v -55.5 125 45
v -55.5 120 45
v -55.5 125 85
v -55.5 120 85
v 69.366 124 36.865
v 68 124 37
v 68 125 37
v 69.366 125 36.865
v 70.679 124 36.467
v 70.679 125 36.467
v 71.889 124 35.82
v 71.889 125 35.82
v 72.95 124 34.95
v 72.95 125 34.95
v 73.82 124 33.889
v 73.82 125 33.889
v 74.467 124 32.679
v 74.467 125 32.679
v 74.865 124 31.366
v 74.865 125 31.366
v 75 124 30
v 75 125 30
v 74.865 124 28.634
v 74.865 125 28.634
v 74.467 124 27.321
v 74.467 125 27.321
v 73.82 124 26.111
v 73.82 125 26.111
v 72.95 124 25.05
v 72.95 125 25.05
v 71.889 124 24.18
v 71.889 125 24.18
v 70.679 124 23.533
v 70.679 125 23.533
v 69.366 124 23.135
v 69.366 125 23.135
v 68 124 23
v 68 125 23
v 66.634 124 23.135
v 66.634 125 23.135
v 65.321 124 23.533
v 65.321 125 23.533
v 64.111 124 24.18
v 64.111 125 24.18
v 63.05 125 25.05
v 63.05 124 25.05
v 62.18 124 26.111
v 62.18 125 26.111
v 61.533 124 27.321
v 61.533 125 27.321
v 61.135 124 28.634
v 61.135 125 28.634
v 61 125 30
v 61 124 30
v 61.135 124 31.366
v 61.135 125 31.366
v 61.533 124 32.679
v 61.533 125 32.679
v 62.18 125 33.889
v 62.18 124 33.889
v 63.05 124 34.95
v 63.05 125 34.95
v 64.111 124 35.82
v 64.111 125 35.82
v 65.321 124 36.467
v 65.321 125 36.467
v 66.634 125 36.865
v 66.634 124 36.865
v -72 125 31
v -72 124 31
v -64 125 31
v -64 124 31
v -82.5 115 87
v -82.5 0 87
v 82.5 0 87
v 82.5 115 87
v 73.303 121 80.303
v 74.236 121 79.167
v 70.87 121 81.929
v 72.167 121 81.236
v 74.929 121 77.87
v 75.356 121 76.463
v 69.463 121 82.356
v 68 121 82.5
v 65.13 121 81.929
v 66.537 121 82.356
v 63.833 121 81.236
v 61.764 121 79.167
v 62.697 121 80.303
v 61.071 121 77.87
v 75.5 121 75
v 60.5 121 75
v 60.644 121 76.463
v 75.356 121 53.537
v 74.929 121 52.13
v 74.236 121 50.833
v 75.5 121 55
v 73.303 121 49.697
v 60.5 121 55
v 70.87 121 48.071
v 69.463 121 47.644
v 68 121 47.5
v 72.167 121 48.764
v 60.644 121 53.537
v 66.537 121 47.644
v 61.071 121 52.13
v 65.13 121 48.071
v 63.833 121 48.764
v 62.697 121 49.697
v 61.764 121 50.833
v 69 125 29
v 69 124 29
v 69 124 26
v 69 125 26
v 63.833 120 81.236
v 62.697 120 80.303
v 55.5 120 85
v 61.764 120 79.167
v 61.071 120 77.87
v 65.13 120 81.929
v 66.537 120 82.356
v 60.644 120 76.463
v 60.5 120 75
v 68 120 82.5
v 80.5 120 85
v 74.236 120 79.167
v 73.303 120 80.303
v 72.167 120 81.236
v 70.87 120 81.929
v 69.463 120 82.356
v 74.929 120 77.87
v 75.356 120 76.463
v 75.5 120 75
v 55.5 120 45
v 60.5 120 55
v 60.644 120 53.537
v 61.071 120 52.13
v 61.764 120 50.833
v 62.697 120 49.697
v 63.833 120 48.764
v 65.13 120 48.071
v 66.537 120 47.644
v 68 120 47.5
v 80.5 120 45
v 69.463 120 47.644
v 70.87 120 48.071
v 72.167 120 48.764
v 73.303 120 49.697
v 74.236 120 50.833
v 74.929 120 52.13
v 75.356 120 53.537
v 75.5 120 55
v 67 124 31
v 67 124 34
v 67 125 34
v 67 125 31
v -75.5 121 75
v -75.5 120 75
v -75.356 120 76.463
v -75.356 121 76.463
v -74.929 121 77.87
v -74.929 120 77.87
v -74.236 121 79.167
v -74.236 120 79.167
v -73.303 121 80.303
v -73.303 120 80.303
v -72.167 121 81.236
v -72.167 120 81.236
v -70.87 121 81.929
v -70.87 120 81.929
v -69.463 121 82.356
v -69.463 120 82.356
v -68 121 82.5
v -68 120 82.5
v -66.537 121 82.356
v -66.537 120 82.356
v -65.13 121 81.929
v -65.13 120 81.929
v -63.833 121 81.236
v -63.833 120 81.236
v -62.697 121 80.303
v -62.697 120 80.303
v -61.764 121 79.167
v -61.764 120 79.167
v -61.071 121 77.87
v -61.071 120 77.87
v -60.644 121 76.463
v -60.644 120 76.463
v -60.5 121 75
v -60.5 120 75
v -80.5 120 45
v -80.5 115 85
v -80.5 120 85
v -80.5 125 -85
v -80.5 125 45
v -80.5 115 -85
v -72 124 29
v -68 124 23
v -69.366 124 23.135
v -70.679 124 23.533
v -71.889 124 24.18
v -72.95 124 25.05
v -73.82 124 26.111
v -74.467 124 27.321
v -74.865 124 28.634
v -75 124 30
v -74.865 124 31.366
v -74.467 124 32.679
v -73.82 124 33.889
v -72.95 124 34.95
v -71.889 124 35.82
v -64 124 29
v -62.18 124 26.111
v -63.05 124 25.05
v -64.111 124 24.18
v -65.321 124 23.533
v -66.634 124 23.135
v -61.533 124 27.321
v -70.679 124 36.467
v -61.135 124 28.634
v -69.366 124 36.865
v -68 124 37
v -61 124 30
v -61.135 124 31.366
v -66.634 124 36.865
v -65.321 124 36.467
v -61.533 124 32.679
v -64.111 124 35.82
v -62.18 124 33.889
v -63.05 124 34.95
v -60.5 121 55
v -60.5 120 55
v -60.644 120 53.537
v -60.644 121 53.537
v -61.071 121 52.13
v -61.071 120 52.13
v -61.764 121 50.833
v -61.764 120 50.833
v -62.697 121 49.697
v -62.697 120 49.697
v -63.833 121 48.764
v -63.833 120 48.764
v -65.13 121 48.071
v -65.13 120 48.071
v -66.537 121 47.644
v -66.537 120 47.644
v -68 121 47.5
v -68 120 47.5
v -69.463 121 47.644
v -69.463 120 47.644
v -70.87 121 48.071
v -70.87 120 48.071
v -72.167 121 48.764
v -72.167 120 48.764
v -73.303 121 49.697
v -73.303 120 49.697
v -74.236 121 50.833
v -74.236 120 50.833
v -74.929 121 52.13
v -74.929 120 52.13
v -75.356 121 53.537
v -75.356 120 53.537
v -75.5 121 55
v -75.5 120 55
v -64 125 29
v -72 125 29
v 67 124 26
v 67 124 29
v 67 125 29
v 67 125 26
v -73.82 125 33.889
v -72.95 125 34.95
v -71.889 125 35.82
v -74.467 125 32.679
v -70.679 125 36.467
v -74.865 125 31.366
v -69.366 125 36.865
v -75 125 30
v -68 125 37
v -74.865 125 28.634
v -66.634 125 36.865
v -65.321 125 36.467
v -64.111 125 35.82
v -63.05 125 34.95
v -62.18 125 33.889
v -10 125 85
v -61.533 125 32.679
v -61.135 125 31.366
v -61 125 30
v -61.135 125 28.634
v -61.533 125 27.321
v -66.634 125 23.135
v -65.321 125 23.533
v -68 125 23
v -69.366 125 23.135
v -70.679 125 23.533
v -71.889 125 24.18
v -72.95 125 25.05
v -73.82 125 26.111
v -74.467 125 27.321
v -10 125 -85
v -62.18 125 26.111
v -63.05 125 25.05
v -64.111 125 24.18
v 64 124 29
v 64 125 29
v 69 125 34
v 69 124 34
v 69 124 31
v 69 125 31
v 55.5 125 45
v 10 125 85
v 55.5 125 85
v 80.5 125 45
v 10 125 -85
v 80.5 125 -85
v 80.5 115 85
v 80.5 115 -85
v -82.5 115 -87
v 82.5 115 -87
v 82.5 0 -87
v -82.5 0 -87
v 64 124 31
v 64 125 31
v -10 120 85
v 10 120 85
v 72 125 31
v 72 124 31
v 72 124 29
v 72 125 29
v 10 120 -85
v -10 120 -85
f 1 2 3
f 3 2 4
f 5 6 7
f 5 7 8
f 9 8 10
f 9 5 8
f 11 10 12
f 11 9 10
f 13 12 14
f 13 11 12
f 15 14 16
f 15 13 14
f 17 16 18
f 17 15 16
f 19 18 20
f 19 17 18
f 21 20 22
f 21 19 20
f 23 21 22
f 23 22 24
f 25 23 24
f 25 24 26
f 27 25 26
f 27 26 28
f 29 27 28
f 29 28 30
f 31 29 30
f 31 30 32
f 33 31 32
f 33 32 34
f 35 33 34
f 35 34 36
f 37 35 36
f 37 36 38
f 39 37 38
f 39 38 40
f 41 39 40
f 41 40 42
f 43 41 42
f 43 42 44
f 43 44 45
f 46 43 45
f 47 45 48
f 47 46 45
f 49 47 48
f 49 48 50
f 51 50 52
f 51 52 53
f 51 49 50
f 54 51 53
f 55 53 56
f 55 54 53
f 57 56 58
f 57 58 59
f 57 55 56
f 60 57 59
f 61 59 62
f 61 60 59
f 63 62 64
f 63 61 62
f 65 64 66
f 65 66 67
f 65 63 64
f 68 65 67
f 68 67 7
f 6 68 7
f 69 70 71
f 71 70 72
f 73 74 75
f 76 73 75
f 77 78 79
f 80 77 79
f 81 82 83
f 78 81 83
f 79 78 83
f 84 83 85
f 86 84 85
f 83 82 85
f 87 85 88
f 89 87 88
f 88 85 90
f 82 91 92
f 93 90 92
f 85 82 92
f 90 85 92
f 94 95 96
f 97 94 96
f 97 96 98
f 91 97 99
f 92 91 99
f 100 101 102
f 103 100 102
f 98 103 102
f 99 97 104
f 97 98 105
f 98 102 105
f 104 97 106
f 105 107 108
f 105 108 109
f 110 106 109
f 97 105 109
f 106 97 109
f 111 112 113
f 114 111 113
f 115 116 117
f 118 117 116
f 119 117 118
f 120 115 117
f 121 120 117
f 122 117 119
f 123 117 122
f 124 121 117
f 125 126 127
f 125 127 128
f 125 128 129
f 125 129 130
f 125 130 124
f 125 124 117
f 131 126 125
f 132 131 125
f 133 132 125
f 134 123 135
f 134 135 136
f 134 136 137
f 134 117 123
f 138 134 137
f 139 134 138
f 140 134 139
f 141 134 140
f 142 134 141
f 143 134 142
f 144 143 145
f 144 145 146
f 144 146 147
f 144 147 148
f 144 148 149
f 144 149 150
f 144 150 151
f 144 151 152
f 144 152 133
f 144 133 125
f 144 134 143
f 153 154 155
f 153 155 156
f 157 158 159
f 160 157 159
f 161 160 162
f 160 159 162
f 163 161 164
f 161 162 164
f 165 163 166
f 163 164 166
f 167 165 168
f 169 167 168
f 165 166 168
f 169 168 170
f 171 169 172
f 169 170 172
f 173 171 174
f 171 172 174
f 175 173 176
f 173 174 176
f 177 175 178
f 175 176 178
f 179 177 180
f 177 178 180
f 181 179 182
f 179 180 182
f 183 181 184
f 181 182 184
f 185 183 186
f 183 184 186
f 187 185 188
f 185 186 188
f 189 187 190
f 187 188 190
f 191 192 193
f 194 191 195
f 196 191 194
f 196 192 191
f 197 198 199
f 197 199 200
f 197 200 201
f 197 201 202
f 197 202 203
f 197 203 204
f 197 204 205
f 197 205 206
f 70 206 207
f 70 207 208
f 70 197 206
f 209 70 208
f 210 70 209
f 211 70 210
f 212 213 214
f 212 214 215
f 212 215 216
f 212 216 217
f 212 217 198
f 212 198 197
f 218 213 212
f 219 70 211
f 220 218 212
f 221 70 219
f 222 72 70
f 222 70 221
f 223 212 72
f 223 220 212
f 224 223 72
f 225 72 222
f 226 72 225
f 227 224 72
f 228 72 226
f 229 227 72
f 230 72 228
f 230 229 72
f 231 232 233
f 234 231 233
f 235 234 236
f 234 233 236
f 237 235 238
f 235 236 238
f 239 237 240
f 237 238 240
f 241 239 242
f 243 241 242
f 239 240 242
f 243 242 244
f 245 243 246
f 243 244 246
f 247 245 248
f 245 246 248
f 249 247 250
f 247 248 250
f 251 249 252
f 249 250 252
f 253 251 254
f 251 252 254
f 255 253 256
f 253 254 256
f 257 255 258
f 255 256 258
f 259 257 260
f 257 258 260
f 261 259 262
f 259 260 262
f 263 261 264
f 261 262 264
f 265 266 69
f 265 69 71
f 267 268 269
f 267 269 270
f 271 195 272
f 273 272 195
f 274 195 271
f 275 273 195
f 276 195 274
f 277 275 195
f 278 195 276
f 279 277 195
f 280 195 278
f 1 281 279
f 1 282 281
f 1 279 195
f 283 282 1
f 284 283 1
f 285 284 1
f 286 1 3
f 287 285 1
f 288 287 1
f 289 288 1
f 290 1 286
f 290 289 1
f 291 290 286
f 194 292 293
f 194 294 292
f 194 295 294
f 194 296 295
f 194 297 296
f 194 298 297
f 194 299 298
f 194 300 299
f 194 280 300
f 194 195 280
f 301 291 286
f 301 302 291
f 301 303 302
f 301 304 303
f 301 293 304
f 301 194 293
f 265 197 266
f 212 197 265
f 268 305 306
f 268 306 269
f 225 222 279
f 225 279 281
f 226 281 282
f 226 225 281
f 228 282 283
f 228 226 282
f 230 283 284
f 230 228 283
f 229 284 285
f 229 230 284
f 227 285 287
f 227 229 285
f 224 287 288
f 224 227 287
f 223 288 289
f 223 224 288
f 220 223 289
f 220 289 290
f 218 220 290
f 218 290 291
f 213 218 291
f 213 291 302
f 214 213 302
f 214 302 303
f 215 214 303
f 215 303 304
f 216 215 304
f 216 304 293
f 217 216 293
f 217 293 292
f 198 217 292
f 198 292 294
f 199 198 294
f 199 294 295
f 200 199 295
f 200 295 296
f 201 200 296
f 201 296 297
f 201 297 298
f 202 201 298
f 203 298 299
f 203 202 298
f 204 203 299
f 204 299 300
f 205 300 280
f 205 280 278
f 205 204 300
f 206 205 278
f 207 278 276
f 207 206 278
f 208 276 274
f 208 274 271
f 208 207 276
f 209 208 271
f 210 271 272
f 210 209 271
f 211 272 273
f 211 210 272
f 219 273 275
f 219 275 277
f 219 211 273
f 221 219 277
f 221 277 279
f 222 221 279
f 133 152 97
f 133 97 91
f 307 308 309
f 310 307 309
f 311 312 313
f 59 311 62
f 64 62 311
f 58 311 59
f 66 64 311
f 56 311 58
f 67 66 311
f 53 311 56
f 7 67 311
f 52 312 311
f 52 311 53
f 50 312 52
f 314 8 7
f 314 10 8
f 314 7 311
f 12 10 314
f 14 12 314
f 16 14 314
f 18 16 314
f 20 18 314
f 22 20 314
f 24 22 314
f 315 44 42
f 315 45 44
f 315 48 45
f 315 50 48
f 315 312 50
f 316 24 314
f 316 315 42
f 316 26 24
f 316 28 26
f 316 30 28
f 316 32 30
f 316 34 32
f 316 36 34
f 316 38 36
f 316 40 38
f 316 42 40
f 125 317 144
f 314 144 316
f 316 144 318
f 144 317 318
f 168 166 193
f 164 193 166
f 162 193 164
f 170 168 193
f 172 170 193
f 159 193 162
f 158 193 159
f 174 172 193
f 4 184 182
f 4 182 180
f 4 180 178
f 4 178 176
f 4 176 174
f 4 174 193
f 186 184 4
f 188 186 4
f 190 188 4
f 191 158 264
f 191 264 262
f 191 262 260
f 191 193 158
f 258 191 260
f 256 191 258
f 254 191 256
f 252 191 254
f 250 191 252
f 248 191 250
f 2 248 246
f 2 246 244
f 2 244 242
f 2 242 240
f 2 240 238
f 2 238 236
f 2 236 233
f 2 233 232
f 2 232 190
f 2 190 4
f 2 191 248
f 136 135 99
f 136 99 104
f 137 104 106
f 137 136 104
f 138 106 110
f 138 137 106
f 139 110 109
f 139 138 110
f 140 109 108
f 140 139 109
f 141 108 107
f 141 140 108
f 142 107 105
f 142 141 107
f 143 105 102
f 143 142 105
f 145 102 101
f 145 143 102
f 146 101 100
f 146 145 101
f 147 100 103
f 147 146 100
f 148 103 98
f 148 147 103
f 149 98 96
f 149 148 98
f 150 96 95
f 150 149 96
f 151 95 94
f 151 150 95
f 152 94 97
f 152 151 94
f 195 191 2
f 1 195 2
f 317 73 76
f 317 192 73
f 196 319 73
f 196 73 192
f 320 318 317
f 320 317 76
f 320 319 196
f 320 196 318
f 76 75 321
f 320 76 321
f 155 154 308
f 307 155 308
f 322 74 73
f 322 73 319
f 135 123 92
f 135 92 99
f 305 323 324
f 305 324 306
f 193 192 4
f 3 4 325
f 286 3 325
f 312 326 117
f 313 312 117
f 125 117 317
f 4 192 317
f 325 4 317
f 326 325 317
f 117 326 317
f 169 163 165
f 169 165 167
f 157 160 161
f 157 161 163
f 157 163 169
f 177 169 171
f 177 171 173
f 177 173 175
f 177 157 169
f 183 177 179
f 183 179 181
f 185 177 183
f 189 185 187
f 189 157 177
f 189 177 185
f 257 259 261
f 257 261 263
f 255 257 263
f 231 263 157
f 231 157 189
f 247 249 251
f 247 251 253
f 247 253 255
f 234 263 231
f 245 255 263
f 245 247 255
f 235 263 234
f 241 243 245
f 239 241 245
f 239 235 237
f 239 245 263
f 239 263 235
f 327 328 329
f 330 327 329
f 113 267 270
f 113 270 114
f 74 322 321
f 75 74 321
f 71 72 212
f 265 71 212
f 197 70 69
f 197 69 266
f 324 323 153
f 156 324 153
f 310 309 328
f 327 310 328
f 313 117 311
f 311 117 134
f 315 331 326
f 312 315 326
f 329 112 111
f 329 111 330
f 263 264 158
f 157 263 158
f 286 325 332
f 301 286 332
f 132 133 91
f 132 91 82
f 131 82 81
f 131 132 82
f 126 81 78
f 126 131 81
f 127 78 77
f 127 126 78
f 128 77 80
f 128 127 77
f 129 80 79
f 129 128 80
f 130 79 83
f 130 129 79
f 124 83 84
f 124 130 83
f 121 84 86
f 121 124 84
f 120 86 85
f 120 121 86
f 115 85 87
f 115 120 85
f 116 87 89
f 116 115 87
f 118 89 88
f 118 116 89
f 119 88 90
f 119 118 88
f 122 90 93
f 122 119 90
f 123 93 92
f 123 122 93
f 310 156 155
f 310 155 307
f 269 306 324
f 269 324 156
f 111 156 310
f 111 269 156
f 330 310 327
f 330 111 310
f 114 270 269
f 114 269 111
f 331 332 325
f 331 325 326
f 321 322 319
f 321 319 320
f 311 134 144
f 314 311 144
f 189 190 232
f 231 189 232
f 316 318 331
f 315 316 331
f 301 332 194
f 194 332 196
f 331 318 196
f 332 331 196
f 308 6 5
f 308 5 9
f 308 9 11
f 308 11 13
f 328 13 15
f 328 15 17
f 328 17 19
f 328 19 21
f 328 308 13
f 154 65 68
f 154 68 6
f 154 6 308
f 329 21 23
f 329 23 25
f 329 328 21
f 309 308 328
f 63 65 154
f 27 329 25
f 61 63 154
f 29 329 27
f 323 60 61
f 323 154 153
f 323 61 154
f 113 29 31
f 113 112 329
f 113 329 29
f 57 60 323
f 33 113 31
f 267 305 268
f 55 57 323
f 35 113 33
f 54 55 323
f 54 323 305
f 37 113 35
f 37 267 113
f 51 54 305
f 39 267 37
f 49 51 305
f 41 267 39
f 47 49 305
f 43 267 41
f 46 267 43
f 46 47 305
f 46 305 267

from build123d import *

# Parameters (mm, degrees)
SKETCH1_R             = 7
BOSS_EXTRUDE3_DEPTH   = 125
BOSS_EXTRUDE3_2_DEPTH = 125
SKETCH1_W             = 8
SKETCH1_H             = 2
BOSS_EXTRUDE3_3_DEPTH = 125
BOSS_EXTRUDE3_4_DEPTH = 125
SKETCH1_6_R           = 7
BOSS_EXTRUDE4_DEPTH   = 124
SKETCH1_7_W           = 20
SKETCH1_7_H           = 170
SKETCH1_7_W_2         = 25
SKETCH1_7_H_2         = 40
BOSS_EXTRUDE5_DEPTH   = 120
BOSS_EXTRUDE6_DEPTH   = 121
SKETCH1_10_W          = 165
SKETCH1_10_H          = 174
BOSS_EXTRUDE7_DEPTH   = 115


with BuildPart() as part:
    # Sketch1 → Boss-Extrude3 (new body)
    with BuildSketch(Plane(origin=(0, 0, 0), x_dir=(1, 0, 0), z_dir=(0, 1, 0))):
        Polygon((80.5, -45), (80.5, 85), (10, 85), (10, -85), (55.5, -85), (55.5, -45), align=None)
        with Locations((68, -30)):
            Circle(SKETCH1_R, mode=Mode.SUBTRACT)
    extrude(amount=BOSS_EXTRUDE3_DEPTH)



with BuildPart() as body_2:
    # Sketch1 → Boss-Extrude3 2 (new body)
    with BuildSketch(Plane(origin=(0, 0, 0), x_dir=(1, 0, 0), z_dir=(0, 1, 0))):
        Polygon((-10, -85), (-10, 85), (-80.5, 85), (-80.5, -45), (-55.5, -45), (-55.5, -85), align=None)
        with Locations((-68, -30)):
            Circle(SKETCH1_R, mode=Mode.SUBTRACT)
    extrude(amount=BOSS_EXTRUDE3_2_DEPTH)


with BuildPart() as body_3:
    # Sketch1 → Boss-Extrude3 3 (new body)
    with BuildSketch(Plane(origin=(0, 0, 0), x_dir=(1, 0, 0), z_dir=(0, 1, 0))):
        with Locations((-68, -30)):
            Rectangle(SKETCH1_W, SKETCH1_H)
    extrude(amount=BOSS_EXTRUDE3_3_DEPTH)


with BuildPart() as body_4:
    # Sketch1 → Boss-Extrude3 4 (new body)
    with BuildSketch(Plane(origin=(0, 0, 0), x_dir=(1, 0, 0), z_dir=(0, 1, 0))):
        Polygon((72, -31), (72, -29), (69, -29), (69, -26), (67, -26), (67, -29), (64, -29), (64, -31), (67, -31), (67, -34), (69, -34), (69, -31), align=None)
    extrude(amount=BOSS_EXTRUDE3_4_DEPTH)


with BuildPart() as part_1:
    add(part.part)

    add(body_2.part)  # Boss-Extrude4 merges body 2

    add(body_3.part)  # Boss-Extrude4 merges body 3

    add(body_4.part)  # Boss-Extrude4 merges body 4
    # Sketch1<6> → Boss-Extrude4 (add)
    with BuildSketch(Plane(origin=(0, 0, 0), x_dir=(1, 0, 0), z_dir=(0, 1, 0))):
        with Locations((-68, -30)):
            Circle(SKETCH1_6_R)
        with Locations((68, -30)):
            Circle(SKETCH1_6_R)
    extrude(amount=BOSS_EXTRUDE4_DEPTH)

    # Sketch1<7> → Boss-Extrude5 (add)
    # profile 1 of 3: a face of its own
    with BuildSketch(Plane(origin=(0, 0, 0), x_dir=(1, 0, 0), z_dir=(0, 1, 0))):
        Rectangle(SKETCH1_7_W, SKETCH1_7_H)
    # profile 2 of 3: a face of its own
    with BuildSketch(Plane(origin=(0, 0, 0), x_dir=(1, 0, 0), z_dir=(0, 1, 0))):
        with Locations((68, -65)):
            Rectangle(SKETCH1_7_W_2, SKETCH1_7_H_2)
        with BuildLine():
            Line((60.5, -75), (60.5, -55))
            ThreePointArc((60.5, -55), (68, -47.5), (75.5, -55))
            Line((75.5, -55), (75.5, -75))
            ThreePointArc((75.5, -75), (68, -82.5), (60.5, -75))
        make_face(mode=Mode.SUBTRACT)
    # profile 3 of 3: a face of its own
    with BuildSketch(Plane(origin=(0, 0, 0), x_dir=(1, 0, 0), z_dir=(0, 1, 0))):
        with Locations((-68, -65)):
            Rectangle(SKETCH1_7_W_2, SKETCH1_7_H_2)
        with BuildLine():
            ThreePointArc((-75.5, -55), (-68, -47.5), (-60.5, -55))
            Line((-60.5, -55), (-60.5, -75))
            ThreePointArc((-60.5, -75), (-68, -82.5), (-75.5, -75))
            Line((-75.5, -75), (-75.5, -55))
        make_face(mode=Mode.SUBTRACT)
    extrude(amount=BOSS_EXTRUDE5_DEPTH)

    # Sketch1<8> → Boss-Extrude6 (add)
    with BuildSketch(Plane(origin=(0, 0, 0), x_dir=(1, 0, 0), z_dir=(0, 1, 0))):
        with BuildLine():
            Line((-60.5, -75), (-60.5, -55))
            ThreePointArc((-60.5, -55), (-68, -47.5), (-75.5, -55))
            Line((-75.5, -55), (-75.5, -75))
            ThreePointArc((-75.5, -75), (-68, -82.5), (-60.5, -75))
        make_face()
        with BuildLine():
            ThreePointArc((75.5, -55), (68, -47.5), (60.5, -55))
            Line((60.5, -55), (60.5, -75))
            ThreePointArc((60.5, -75), (68, -82.5), (75.5, -75))
            Line((75.5, -75), (75.5, -55))
        make_face()
    extrude(amount=BOSS_EXTRUDE6_DEPTH)

    # Sketch1<10> → Boss-Extrude7 (add)
    with BuildSketch(Plane(origin=(0, 0, 0), x_dir=(1, 0, 0), z_dir=(0, 1, 0))):
        Rectangle(SKETCH1_10_W, SKETCH1_10_H)
    extrude(amount=BOSS_EXTRUDE7_DEPTH)


solid = part_1.part
